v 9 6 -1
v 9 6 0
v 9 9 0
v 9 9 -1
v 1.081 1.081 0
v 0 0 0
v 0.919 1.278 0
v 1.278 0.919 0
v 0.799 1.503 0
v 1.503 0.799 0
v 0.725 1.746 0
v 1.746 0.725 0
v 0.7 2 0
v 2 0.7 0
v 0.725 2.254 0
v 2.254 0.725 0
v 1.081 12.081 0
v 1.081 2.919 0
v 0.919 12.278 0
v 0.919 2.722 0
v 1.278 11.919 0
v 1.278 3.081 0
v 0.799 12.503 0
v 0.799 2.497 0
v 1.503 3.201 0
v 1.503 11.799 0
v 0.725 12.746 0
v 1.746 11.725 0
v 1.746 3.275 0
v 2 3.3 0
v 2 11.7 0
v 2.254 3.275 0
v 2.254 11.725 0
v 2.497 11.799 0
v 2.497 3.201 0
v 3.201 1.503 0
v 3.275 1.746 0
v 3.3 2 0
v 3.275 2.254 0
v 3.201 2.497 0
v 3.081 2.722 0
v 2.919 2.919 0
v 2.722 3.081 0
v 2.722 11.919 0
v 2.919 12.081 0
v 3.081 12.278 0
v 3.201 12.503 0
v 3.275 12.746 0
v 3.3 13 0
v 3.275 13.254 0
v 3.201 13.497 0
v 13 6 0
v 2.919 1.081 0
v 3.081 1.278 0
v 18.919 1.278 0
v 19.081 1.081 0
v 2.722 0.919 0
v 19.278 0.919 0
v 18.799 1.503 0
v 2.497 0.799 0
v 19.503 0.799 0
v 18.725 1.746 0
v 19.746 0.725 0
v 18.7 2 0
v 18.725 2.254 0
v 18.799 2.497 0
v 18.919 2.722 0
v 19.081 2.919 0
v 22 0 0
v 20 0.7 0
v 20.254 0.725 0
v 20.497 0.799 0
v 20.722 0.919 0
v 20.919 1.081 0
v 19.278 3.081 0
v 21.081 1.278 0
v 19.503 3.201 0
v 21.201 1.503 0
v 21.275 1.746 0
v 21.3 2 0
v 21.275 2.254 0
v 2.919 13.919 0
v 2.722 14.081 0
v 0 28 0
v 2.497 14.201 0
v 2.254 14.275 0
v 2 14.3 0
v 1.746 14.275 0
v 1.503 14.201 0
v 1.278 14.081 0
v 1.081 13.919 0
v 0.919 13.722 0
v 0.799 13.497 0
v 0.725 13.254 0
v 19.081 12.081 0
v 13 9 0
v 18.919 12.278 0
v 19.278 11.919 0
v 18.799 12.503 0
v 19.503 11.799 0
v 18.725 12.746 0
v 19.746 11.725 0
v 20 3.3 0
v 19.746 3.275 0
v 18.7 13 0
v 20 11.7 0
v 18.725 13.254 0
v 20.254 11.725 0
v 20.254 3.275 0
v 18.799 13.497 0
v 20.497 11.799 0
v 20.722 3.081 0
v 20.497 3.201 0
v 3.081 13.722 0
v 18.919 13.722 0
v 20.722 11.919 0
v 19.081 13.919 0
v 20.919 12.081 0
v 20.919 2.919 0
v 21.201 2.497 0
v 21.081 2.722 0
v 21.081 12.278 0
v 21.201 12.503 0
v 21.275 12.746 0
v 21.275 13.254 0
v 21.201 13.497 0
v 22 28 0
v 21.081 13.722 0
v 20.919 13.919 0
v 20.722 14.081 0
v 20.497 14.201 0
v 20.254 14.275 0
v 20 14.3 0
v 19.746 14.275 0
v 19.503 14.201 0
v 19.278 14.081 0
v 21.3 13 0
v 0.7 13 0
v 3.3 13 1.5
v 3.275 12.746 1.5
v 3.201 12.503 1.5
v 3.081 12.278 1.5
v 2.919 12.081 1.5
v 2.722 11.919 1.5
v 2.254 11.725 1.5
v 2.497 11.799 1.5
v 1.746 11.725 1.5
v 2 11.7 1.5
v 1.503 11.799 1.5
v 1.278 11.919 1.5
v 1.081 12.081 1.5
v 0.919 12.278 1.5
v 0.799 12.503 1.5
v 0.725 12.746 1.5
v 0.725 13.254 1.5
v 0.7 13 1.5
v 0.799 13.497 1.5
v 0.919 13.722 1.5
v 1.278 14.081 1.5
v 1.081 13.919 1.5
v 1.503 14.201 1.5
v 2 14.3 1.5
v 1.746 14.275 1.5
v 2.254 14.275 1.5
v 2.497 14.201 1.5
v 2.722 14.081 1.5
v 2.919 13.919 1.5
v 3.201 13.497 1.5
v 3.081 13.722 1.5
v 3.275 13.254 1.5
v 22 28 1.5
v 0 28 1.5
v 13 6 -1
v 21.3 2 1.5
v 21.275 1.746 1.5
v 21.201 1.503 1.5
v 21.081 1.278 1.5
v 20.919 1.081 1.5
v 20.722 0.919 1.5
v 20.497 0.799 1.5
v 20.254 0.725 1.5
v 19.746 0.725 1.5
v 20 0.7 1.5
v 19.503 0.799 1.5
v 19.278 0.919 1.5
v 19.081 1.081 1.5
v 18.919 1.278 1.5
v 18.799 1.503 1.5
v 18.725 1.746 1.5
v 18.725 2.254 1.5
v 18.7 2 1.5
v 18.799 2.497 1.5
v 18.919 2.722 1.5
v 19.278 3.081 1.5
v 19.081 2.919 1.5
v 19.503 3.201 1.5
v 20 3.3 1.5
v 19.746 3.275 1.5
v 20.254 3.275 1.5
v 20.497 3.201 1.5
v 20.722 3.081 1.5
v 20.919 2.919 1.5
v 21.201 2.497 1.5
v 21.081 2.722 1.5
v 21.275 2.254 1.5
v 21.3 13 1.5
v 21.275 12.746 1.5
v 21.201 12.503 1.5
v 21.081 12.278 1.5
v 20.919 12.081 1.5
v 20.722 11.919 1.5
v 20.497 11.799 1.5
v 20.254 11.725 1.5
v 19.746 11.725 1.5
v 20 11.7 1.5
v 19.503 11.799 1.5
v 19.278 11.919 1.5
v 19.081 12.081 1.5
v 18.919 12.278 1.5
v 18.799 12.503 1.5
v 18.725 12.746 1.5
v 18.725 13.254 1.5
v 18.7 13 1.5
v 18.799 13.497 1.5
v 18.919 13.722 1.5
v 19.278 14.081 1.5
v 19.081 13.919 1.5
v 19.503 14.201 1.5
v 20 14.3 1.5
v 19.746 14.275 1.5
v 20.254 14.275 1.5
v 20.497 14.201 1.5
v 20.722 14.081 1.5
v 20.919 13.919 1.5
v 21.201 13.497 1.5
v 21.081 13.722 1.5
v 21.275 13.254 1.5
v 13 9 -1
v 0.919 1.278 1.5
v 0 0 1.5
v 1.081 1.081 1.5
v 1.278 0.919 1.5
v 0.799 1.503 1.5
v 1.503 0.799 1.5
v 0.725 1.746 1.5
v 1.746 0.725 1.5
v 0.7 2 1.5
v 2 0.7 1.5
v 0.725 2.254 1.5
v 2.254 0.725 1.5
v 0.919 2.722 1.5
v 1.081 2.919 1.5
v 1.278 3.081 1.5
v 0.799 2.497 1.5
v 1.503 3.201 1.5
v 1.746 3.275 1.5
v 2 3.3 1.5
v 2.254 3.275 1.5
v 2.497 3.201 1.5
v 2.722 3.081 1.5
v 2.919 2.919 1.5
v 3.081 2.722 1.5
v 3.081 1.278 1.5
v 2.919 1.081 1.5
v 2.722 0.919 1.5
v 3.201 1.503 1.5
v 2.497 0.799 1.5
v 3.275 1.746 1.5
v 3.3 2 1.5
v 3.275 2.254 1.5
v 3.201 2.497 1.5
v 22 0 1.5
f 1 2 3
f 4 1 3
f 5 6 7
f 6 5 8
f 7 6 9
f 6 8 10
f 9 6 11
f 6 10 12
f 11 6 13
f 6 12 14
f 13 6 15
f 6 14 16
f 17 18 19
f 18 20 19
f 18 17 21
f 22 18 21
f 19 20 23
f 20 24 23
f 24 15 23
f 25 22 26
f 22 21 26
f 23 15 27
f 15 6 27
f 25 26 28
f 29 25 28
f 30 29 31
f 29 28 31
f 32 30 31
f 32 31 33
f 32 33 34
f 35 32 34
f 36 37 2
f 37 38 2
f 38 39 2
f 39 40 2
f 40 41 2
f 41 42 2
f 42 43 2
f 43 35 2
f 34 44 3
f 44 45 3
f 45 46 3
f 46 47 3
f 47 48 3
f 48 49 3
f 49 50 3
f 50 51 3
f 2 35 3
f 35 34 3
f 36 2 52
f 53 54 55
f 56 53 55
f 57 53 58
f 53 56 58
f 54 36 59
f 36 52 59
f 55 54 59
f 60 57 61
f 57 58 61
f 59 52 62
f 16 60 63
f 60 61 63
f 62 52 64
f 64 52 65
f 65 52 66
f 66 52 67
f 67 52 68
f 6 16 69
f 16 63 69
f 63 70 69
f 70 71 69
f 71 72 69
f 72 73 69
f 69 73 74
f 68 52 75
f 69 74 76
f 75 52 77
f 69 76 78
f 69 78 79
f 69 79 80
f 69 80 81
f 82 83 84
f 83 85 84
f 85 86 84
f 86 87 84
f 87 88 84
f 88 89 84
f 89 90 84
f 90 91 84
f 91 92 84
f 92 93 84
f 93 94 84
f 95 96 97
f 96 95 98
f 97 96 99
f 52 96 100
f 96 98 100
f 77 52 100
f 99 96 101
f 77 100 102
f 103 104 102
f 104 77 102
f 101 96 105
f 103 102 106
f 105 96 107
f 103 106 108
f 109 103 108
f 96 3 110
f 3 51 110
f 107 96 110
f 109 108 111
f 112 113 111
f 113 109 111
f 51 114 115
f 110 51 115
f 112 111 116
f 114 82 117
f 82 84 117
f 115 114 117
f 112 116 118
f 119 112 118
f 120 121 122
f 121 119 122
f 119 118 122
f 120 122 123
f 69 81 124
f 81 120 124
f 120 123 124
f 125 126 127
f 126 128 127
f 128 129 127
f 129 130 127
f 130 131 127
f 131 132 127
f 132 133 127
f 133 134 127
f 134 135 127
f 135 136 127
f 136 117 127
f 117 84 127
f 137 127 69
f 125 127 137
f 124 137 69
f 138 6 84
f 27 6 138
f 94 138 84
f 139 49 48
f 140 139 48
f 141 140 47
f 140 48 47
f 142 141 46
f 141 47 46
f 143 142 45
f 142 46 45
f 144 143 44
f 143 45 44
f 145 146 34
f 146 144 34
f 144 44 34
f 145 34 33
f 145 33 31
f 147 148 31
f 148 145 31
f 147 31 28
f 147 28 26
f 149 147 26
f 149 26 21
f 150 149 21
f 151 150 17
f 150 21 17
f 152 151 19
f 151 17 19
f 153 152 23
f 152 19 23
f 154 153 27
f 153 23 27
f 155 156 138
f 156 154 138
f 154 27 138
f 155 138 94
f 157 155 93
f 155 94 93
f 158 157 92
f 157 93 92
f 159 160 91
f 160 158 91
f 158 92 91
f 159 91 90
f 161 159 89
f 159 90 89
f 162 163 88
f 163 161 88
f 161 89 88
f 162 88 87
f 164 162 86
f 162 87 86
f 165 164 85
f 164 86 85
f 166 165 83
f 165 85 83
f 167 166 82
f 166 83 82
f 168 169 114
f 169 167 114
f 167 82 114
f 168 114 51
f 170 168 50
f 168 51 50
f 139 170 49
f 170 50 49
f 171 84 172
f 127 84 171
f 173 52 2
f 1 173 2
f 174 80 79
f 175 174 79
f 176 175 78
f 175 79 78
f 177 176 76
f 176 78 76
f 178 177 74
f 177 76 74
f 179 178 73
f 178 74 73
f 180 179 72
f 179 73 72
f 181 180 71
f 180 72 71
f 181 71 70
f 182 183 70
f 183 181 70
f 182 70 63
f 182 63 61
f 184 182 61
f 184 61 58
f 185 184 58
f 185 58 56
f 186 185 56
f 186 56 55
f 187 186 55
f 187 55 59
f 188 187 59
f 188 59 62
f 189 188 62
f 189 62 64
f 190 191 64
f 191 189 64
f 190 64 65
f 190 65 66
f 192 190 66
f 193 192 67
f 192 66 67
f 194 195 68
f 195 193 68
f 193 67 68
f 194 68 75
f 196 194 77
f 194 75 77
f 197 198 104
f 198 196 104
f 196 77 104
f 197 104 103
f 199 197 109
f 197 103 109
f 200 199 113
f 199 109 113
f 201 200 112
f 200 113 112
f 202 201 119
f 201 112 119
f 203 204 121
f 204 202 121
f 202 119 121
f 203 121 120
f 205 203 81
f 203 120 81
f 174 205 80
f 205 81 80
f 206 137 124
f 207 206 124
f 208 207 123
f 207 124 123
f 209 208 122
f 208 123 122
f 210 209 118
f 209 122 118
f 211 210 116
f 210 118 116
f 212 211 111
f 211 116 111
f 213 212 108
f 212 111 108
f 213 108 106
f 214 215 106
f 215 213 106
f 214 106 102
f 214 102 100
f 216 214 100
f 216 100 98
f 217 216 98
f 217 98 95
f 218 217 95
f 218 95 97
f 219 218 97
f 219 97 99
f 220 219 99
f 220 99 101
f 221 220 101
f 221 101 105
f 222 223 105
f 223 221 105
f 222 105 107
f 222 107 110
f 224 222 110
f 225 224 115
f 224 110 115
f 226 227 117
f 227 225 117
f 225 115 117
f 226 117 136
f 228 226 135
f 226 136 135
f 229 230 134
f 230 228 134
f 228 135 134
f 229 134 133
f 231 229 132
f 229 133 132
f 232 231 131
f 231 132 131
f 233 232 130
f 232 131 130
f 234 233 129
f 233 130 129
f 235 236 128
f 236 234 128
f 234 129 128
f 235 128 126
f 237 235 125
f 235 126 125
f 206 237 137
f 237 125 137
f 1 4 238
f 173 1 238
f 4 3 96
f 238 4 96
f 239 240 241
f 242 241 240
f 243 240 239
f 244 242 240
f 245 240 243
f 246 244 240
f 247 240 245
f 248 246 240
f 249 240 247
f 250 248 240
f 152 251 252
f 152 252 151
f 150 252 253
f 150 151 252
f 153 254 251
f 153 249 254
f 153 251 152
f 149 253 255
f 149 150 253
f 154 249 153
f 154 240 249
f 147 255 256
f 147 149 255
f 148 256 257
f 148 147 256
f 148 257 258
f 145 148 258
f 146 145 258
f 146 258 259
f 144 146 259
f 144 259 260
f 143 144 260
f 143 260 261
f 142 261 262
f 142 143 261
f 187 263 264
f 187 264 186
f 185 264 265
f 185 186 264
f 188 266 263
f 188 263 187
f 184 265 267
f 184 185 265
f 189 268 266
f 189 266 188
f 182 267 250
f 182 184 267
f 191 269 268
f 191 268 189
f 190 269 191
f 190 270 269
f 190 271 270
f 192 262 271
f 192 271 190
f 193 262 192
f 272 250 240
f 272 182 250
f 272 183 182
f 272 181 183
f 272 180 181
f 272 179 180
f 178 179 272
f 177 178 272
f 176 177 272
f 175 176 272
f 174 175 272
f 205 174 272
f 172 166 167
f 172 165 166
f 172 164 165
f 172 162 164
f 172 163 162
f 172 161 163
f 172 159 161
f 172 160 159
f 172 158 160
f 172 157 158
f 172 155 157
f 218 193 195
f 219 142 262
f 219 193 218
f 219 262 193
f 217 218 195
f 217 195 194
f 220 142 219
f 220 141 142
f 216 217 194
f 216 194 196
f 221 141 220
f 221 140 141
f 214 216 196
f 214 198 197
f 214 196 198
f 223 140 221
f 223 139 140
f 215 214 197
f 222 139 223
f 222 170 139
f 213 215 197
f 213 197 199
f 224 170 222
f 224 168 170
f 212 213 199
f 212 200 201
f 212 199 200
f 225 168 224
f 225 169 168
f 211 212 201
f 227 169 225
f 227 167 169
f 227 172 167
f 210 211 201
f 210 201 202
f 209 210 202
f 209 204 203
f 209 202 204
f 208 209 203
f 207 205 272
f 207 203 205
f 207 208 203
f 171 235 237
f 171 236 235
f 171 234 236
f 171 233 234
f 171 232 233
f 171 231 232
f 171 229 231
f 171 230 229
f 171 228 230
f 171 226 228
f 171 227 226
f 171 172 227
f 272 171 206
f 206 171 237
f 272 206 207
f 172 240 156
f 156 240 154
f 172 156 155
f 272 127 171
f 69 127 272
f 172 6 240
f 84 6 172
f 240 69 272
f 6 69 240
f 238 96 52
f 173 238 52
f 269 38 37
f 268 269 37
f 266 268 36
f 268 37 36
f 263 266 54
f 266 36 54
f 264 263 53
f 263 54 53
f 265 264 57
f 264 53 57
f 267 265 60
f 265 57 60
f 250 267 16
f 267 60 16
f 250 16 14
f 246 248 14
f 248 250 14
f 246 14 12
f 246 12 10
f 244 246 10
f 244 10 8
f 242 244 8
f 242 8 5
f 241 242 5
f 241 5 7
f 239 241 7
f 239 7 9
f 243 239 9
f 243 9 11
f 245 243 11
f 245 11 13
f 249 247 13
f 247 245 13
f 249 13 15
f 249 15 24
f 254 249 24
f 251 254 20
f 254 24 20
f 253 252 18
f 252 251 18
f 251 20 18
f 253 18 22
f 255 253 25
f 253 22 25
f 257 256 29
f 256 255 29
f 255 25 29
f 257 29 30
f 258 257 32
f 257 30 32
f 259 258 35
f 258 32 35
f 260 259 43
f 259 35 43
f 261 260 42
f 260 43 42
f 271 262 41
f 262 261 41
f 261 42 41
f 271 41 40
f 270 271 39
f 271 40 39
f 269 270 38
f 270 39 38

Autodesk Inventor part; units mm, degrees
ref_plane "YZ Plane" through (0, 0, 0) normal (1, 0, 0) x (0, 1, 0)
ref_plane "XZ Plane" through (0, 0, 0) normal (0, 1, 0) x (-1, 0, 0)
ref_plane "XY Plane" through (0, 0, 0) normal (0, 0, 1) x (1, 0, 0)
sketch "Sketch1" plane through (0, 0, 0) normal (0, 0, 1) x (1, 0, 0)
  line L0 (0, 0) -> (0, 28)
  line L1 (0, 28) -> (22, 28)
  line L2 (22, 28) -> (22, 0)
  line L3 (22, 0) -> (0, 0)
  circle A0 centre (2, 13) radius 1.3
  circle A1 centre (20, 13) radius 1.3
  circle A2 centre (2, 2) radius 1.3
  circle A3 centre (20, 2) radius 1.3
  line L4 (11, 28) -> (11, 0) construction
  line L5 (2, 13) -> (20, 13) construction
  line L6 (2, 2) -> (20, 2) construction
  line L7 (9, 9) -> (13, 9)
  line L8 (13, 9) -> (13, 6)
  line L9 (13, 6) -> (9, 6)
  line L10 (9, 6) -> (9, 9)
  line L11 (2, 13) -> (2, 2)
  line L12 (9, 7.5) -> (13, 7.5) construction
  line L13 (11, 13) -> (11, 2) construction
  point P0 (11, 9)
  point P1 (11, 7.5)
  dimension "d0" = 28
  dimension "d1" = 22
  dimension "d2" = 2.6
  dimension "d5" = 18
  dimension "d8" = 11
  dimension "d11" = 2
  dimension "d14" = 4
  dimension "d15" = 3
extrude "Extrusion1" add sketch "Sketch1" along normal blind 1.5 contours L0 L1 L2 L3 | L7 L8 L9 L10
extrude "Extrusion2" add sketch "Sketch1" against normal blind 1 contours L7 L8 L9 L10
properties part number "Encoder"
